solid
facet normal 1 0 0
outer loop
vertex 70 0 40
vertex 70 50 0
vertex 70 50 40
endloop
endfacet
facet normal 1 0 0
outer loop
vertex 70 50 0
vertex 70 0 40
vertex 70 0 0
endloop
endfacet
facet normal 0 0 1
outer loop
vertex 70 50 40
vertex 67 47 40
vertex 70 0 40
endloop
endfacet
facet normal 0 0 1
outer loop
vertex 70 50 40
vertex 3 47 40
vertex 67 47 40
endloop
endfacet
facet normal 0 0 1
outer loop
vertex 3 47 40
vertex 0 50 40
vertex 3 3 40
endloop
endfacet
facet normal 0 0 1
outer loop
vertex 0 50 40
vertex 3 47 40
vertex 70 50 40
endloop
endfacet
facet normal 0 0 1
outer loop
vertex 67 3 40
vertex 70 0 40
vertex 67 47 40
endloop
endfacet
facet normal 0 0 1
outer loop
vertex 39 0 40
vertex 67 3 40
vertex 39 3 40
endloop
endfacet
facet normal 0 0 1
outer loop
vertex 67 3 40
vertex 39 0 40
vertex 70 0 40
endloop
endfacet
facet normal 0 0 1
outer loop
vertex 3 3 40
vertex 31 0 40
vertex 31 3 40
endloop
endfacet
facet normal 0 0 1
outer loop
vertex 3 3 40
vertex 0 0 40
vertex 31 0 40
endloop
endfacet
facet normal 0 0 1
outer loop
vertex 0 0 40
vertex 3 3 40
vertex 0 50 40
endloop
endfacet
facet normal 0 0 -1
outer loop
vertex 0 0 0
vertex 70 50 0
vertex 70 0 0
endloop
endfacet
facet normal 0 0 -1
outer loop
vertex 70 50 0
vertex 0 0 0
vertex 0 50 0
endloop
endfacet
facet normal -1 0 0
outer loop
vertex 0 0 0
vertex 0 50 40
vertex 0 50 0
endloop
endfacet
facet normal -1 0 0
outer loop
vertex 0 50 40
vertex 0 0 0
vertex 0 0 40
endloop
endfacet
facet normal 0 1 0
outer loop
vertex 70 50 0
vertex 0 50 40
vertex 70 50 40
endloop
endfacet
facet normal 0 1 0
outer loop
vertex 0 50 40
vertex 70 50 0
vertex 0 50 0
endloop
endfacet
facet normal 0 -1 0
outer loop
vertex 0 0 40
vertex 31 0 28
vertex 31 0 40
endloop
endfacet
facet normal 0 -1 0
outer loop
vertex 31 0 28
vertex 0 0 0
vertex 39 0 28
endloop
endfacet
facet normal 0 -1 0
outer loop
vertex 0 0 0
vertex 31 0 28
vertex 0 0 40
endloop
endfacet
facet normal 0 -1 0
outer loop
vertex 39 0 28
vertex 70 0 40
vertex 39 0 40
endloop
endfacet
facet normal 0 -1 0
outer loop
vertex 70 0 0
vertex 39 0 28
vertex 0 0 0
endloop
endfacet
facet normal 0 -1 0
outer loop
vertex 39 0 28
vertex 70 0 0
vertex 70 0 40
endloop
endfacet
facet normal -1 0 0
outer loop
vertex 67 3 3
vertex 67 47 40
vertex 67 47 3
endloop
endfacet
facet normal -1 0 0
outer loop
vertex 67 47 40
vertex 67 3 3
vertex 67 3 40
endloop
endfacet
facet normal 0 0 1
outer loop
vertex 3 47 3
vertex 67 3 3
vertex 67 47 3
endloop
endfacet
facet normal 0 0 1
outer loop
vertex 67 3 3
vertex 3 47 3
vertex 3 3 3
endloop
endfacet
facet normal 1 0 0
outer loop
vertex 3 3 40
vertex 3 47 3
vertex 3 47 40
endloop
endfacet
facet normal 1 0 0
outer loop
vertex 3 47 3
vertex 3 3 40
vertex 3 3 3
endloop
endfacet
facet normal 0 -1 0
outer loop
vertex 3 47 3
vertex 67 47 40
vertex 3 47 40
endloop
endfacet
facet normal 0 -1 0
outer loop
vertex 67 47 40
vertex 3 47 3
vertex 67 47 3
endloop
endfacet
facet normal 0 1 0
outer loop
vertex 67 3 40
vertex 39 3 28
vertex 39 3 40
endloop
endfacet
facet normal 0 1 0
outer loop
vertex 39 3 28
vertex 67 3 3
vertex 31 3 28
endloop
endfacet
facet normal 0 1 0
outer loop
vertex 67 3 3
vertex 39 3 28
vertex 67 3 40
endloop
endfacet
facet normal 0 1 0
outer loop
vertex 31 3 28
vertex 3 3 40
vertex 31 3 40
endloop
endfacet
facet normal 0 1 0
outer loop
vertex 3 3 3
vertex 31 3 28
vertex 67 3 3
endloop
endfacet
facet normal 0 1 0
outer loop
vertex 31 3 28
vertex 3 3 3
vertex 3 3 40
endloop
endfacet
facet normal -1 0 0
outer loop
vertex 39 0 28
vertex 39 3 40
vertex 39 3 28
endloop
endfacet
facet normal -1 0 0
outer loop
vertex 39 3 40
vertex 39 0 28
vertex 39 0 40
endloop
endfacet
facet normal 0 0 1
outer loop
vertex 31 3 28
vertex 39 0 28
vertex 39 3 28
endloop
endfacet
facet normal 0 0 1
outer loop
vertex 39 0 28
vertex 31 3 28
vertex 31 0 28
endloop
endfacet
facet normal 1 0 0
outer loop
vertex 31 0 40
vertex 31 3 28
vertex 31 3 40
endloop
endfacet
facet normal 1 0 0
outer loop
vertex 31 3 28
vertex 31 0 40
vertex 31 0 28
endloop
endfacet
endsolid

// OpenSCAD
$fn = 32;

// ----------------------------------------------------------------------
// Enclosure box: notch enclosure
// ----------------------------------------------------------------------

// --- parameters (mm) ---
box_l = 70;               // outer length, X
box_w = 50;               // outer width, Y
box_h = 40;               // outer height
wall_t = 3;               // wall thickness
notch_w = 8;              // cable notch width
notch_h = 12;             // cable notch height

inner_h = box_h - wall_t;  // cavity depth
boss_h = inner_h - 2;  // corner boss height

difference() {
  union() {
    difference() {
      cube([box_l, box_w, box_h]);
      translate([wall_t, wall_t, wall_t])
        cube([box_l - 2 * wall_t, box_w - 2 * wall_t, box_h]);
    }
  }
  translate([box_l / 2 - notch_w / 2, -1, box_h - notch_h])
    cube([notch_w, wall_t + 2, notch_h + 1]);
}
